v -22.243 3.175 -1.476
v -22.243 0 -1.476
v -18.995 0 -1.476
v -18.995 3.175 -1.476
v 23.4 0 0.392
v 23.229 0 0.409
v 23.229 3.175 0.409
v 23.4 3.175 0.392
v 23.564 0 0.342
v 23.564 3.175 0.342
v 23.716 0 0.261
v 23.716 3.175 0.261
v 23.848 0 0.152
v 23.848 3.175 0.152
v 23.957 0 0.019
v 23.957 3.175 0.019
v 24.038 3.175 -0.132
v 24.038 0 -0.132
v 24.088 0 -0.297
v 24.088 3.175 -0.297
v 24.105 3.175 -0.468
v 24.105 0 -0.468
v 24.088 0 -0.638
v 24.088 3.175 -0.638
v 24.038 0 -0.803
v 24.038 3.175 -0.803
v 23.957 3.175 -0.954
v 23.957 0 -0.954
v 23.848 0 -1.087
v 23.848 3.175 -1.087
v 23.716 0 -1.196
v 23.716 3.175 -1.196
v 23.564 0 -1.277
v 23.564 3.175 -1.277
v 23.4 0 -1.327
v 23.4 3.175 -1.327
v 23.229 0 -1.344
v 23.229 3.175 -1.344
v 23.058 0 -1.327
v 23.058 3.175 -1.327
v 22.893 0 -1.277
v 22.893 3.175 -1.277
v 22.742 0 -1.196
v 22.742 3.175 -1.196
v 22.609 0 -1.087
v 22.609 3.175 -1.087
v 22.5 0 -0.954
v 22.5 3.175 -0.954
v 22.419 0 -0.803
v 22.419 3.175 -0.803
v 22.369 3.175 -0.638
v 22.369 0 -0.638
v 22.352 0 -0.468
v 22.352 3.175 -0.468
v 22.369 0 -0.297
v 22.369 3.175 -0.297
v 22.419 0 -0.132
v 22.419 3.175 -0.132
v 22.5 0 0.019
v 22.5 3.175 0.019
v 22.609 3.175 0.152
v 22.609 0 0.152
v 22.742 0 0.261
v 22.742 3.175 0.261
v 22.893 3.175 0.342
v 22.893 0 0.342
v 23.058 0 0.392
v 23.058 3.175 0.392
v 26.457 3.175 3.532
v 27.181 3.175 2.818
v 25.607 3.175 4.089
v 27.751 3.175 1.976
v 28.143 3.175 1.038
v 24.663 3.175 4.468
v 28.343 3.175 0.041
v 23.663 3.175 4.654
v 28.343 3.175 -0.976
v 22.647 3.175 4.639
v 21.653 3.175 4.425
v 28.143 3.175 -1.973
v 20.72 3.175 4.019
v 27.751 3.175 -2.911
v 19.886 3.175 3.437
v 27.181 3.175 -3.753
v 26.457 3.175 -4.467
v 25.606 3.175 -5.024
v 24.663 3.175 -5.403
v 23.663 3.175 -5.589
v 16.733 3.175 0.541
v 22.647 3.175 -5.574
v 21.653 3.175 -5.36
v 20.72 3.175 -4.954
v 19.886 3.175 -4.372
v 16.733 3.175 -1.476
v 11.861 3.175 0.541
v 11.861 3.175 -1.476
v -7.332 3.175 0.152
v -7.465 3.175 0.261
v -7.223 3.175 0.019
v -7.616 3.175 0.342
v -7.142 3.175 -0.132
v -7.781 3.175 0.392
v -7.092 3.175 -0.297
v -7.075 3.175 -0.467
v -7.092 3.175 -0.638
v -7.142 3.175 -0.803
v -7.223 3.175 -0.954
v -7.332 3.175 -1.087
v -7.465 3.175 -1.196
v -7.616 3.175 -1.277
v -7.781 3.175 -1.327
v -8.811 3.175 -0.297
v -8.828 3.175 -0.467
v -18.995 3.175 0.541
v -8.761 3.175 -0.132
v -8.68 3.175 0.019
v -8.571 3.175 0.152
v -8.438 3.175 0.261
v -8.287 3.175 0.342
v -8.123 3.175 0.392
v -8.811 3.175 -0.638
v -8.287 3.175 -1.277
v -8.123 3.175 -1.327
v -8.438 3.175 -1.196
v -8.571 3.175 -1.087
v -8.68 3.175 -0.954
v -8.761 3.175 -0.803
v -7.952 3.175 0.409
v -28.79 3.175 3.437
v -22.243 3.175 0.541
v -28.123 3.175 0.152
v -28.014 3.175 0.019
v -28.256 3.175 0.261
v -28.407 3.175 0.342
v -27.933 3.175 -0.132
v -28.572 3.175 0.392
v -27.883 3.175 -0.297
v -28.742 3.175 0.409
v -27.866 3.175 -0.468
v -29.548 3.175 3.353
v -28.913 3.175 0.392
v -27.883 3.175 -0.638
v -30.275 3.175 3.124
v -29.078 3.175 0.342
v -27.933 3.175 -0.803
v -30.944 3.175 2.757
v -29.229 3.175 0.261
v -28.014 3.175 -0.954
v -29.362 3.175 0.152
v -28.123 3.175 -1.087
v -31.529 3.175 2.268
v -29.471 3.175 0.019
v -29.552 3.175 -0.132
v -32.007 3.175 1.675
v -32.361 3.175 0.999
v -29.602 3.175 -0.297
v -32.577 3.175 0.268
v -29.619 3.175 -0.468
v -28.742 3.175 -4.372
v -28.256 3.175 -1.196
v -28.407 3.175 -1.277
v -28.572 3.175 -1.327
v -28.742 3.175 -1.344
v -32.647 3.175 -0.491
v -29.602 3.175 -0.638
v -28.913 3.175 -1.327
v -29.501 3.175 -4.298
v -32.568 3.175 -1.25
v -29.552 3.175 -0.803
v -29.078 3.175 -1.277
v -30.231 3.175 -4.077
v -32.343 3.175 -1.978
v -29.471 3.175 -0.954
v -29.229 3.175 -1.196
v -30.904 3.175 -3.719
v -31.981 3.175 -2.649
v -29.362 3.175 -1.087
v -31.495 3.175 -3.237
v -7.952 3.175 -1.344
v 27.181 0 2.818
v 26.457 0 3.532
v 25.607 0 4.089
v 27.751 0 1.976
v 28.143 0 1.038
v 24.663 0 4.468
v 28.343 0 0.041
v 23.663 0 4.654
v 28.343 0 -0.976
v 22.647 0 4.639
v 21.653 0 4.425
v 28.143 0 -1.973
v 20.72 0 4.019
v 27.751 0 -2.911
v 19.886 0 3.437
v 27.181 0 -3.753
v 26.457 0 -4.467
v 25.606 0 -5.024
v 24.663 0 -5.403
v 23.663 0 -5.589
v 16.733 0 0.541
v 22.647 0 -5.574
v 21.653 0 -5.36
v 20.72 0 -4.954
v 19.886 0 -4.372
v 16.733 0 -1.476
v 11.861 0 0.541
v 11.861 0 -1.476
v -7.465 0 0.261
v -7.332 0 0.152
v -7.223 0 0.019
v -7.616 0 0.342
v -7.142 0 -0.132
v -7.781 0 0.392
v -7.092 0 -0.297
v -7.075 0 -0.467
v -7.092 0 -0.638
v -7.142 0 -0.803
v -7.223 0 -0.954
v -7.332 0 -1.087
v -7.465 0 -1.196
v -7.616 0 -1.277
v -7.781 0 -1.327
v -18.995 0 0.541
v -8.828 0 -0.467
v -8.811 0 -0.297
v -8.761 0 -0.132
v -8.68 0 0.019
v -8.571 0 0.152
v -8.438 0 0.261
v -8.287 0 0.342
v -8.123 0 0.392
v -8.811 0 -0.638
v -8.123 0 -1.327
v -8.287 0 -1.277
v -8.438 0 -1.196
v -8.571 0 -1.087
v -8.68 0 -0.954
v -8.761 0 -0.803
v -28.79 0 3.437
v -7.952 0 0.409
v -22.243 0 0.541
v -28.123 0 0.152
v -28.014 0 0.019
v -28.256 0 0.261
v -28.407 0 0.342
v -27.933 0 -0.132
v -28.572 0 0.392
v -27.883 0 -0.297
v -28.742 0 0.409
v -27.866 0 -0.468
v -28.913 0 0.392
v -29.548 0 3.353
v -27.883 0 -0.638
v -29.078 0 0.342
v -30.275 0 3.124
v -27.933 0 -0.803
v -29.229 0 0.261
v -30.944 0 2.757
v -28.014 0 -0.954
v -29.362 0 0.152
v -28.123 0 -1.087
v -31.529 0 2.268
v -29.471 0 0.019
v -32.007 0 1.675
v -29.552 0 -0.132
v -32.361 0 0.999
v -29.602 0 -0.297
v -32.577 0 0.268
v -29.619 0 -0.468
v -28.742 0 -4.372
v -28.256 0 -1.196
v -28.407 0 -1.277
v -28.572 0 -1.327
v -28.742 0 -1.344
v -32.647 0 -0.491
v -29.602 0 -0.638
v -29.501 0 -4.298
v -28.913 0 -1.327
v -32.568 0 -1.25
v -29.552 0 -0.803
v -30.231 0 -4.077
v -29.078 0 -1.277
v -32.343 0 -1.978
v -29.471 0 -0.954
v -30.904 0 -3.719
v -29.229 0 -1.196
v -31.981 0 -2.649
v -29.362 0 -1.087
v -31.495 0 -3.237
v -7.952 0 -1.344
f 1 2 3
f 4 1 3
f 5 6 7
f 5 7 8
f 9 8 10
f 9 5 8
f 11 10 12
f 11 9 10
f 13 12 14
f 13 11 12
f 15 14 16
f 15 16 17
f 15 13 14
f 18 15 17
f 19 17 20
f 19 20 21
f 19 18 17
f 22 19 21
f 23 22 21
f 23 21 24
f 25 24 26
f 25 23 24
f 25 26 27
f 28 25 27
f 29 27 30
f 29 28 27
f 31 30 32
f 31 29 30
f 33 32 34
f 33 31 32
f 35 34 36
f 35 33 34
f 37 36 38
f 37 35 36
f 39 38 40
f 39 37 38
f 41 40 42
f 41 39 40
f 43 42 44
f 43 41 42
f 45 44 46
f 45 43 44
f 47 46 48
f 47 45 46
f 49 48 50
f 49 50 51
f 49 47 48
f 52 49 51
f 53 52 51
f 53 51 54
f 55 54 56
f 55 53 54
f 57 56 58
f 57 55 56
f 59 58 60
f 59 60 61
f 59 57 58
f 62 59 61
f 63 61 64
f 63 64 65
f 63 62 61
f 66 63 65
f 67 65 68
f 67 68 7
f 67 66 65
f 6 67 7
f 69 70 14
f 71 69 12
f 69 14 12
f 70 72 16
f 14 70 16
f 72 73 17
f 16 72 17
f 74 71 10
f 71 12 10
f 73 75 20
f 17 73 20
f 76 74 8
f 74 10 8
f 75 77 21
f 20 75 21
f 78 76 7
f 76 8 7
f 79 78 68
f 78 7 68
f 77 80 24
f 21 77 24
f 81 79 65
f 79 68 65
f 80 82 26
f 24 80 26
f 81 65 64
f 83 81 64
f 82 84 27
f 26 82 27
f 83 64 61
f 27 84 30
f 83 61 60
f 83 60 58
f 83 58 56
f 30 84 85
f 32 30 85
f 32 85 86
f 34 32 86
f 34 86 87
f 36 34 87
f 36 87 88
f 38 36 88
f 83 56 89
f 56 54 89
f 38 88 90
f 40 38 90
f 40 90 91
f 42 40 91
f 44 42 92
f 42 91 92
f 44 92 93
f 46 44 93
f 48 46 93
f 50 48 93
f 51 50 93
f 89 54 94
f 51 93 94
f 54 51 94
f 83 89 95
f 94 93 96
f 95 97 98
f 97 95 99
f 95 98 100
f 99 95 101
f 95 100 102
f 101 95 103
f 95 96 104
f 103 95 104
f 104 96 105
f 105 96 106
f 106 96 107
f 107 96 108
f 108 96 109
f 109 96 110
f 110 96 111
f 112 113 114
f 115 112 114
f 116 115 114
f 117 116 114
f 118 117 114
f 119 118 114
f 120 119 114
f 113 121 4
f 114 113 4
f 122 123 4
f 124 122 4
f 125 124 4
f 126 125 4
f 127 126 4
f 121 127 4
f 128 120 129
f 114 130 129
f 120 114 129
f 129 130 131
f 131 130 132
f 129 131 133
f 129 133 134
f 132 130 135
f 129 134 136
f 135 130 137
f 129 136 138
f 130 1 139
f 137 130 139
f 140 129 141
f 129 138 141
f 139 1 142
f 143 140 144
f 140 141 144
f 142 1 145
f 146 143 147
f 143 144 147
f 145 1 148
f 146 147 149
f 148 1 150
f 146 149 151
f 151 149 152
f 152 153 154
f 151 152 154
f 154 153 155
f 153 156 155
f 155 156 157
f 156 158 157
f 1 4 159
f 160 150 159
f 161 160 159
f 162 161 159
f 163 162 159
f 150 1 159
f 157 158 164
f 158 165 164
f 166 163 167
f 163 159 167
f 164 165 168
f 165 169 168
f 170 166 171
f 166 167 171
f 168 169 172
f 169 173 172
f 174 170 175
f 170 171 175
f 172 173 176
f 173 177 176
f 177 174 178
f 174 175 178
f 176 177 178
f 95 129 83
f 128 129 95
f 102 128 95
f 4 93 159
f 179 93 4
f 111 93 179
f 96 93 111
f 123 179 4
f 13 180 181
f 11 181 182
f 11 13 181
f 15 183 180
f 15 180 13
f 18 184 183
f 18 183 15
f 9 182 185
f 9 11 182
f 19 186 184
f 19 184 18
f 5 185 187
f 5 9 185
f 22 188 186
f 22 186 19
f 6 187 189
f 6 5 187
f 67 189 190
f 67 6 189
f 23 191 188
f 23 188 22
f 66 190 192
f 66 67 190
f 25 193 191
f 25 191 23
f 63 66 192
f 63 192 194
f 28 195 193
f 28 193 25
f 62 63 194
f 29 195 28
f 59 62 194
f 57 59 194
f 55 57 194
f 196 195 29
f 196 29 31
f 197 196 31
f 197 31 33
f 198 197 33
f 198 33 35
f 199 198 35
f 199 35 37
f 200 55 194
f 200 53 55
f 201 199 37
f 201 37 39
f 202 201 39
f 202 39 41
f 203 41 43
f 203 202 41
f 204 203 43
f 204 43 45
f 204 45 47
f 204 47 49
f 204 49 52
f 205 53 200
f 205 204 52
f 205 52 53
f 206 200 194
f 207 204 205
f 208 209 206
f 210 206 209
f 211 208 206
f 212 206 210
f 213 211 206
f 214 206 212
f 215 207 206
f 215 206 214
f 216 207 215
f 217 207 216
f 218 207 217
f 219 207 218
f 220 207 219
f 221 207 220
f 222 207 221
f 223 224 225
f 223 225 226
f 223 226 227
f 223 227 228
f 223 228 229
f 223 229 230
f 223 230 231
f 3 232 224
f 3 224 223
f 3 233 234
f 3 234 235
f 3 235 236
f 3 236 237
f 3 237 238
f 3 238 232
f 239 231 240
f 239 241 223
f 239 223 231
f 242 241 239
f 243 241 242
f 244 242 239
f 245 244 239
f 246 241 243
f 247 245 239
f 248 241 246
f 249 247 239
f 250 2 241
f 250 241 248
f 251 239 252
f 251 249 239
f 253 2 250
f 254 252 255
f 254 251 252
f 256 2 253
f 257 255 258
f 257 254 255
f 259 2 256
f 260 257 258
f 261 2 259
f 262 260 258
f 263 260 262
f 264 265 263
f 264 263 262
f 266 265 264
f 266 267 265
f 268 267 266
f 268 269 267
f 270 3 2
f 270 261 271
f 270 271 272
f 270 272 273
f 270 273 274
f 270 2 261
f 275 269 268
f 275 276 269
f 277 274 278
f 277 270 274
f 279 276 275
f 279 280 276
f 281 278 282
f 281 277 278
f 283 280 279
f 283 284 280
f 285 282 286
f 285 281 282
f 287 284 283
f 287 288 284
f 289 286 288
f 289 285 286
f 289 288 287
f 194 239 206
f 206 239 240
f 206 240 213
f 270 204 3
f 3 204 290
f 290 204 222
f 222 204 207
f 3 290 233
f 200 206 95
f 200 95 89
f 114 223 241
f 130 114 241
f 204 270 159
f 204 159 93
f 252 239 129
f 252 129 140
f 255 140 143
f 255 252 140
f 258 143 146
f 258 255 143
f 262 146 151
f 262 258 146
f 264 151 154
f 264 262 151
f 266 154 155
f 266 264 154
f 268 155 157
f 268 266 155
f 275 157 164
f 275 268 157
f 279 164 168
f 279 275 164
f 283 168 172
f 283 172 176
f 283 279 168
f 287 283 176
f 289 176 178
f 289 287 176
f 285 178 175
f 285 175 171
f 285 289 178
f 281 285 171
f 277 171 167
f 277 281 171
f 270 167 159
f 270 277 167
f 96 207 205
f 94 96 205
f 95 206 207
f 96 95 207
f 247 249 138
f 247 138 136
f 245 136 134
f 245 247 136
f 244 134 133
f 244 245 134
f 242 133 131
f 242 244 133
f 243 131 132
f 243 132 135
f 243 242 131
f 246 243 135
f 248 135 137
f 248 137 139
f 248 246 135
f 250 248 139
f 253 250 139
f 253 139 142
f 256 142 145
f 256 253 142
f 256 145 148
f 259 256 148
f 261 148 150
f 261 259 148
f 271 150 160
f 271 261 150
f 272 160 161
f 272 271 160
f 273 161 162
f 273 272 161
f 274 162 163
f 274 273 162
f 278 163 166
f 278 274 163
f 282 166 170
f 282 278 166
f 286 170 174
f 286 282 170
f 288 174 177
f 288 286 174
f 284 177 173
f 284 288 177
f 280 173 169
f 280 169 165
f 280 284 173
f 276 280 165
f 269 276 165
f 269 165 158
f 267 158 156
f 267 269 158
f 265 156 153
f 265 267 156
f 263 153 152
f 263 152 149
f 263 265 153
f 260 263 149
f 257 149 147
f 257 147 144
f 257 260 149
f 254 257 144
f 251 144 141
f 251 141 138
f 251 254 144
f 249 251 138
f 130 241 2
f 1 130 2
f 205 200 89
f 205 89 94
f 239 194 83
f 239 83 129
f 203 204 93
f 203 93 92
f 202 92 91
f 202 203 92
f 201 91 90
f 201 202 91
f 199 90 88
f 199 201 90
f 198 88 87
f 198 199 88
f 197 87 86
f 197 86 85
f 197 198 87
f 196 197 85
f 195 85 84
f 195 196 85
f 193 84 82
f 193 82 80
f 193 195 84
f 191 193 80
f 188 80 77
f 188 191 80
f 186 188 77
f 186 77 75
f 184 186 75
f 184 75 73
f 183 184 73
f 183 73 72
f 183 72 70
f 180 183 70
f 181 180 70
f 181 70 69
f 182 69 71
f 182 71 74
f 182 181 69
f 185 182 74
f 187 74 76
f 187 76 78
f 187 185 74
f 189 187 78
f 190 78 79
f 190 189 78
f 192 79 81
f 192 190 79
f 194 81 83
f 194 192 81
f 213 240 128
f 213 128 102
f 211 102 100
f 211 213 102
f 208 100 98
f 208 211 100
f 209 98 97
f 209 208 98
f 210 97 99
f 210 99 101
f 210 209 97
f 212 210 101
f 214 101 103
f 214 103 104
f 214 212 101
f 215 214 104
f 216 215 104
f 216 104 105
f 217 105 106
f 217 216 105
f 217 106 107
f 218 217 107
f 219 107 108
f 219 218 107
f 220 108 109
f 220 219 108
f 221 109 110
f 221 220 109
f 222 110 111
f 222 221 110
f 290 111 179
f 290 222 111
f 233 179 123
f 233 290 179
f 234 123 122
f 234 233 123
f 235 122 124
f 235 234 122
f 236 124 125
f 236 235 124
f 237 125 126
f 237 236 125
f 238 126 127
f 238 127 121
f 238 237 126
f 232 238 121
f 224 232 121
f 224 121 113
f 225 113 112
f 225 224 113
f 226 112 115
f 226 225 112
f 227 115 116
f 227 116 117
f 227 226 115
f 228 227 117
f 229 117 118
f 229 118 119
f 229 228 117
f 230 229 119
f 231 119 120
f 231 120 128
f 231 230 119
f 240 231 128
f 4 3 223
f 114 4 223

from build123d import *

# Parameters (mm, degrees)
SKETCH1_R           = 0.8763
SKETCH1_W           = 4.871922601
SKETCH1_H           = 2.01733498
BOSS_EXTRUDE1_DEPTH = 3.175


with BuildPart() as part:
    # Sketch1 → Boss-Extrude1 (new body)
    with BuildSketch(Plane(origin=(0, 0, 0), x_dir=(1, 0, 0), z_dir=(0, 1, 0))):
        with BuildLine():
            Line((19.886382458, -3.437122558), (-28.789940164, -3.436792079))
            ThreePointArc((-28.789940164, -3.436792079), (-32.647020001, 0.491263054), (-28.742479365, 4.372144967))
            Line((-28.742479365, 4.372144967), (19.886338504, 4.372144967))
            ThreePointArc((19.886338504, 4.372144967), (28.36848968, 0.467558945), (19.886382458, -3.437122558))
        make_face()
        with Locations(Location((-28.742479365, 0.467532217, 0), (0, 0, 270))):
            Circle(SKETCH1_R, mode=Mode.SUBTRACT)
        with Locations(Location((-7.951646395, 0.467466465, 0), (0, 0, 270))):
            Circle(SKETCH1_R, mode=Mode.SUBTRACT)
        with Locations(Location((23.228702339, 0.467530016, 0), (0, 0, 270))):
            Circle(SKETCH1_R, mode=Mode.SUBTRACT)
        Polygon((-22.242501784, 1.443620076), (-22.242501784, 1.476197509), (-18.994538581, 1.476197509), (-18.994538581, 1.443620076), (-18.994538581, -0.508687146), (-18.994538581, -0.541137472), (-22.242501784, -0.541137472), (-22.242501784, -0.508687146), align=None, mode=Mode.SUBTRACT)
        with Locations((14.296879657, 0.467530017)):
            Rectangle(SKETCH1_W, SKETCH1_H, mode=Mode.SUBTRACT)
    extrude(amount=BOSS_EXTRUDE1_DEPTH)


solid = part.part
